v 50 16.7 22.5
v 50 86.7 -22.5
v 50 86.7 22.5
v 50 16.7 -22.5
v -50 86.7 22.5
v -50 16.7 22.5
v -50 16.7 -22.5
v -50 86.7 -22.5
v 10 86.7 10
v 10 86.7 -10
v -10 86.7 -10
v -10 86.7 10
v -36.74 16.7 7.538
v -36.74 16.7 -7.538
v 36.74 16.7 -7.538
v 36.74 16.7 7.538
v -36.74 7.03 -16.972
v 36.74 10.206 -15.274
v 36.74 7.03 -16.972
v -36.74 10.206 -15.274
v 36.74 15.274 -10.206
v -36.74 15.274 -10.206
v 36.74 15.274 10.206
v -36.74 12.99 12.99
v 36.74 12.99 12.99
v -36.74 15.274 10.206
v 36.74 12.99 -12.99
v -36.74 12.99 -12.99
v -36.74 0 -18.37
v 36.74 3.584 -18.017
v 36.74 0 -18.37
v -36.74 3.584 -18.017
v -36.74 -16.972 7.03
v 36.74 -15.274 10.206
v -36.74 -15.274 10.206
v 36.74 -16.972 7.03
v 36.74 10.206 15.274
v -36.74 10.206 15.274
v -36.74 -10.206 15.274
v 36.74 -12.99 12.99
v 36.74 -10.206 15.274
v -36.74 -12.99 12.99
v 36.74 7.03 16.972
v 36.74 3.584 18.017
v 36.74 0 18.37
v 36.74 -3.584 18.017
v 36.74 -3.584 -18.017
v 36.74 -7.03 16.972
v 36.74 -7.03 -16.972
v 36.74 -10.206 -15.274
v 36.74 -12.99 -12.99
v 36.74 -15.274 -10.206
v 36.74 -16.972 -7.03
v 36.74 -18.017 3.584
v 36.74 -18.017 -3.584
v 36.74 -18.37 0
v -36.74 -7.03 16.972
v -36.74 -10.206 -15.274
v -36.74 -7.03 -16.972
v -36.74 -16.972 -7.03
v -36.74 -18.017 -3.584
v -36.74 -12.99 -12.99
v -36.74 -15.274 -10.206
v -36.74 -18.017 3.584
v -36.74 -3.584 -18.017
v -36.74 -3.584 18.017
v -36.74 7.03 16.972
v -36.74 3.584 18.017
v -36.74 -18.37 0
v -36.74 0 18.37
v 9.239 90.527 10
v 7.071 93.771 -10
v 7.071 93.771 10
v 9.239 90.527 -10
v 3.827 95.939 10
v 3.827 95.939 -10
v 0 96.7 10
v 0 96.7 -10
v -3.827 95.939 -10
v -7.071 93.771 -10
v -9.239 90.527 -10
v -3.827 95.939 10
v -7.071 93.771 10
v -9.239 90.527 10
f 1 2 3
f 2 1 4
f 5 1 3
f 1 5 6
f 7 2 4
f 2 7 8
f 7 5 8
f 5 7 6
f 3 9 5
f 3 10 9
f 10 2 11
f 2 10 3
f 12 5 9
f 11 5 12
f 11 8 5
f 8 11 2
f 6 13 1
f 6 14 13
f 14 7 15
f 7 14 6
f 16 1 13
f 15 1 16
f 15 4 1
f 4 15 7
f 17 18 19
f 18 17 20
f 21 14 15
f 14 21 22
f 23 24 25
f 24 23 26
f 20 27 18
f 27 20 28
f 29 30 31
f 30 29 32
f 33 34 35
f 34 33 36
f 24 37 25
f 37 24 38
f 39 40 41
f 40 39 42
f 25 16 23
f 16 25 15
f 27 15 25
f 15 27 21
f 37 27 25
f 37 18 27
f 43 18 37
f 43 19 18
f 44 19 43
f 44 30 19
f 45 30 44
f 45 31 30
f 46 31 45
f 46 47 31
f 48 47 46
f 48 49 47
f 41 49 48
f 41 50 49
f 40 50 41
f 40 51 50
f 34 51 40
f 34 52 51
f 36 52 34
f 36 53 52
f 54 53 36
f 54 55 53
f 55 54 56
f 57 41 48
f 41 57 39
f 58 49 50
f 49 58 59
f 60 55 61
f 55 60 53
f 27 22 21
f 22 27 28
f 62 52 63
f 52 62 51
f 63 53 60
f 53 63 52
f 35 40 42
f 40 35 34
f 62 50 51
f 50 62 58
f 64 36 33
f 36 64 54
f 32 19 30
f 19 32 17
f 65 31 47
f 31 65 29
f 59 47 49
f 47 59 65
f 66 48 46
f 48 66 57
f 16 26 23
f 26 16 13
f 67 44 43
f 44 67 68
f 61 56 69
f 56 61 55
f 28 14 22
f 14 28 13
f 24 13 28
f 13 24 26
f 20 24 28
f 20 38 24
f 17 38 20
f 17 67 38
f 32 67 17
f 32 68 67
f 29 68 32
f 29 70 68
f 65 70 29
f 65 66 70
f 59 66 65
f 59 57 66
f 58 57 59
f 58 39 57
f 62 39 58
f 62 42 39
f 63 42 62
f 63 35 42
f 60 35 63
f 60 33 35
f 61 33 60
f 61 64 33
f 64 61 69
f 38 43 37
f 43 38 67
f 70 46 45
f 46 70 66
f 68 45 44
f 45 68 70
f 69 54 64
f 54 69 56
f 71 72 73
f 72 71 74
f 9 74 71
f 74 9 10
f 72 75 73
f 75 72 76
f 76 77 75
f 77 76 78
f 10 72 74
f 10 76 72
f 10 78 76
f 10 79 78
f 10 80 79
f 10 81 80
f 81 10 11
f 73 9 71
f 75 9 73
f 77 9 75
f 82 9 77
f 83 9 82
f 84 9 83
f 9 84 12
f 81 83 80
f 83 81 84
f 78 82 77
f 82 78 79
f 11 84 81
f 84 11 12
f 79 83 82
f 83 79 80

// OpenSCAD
// Auto-generated by scripts/author_from_manifest.py (Phase D.3).
// Source: data/phase_d_manifest.json (sku_intent='potter-vsr-flow-switch-6in').
// Do not hand-edit — regenerate from the manifest.
//
// @part potter_vsr_flow_switch_6in
// @kind device
// @category trim.flow.switch
// @display-name "Potter VSR Vane Flow Switch 6\""
// @mfg potter_electric_signal
// @mfg-pn VSR-6
// @listing UL FM
// @price-usd 155.00
// @install-minutes 18
// @crew journeyman
// @param size_in number default=6 label="Size" unit="in"
// @port pipe position=[0,0,0] direction=[-1,0,0] style=grooved size_in=6 role=run_a

size_in = 6.0;

function od_mm(nps) =
    nps ==   1  ? 33.4 :
    nps == 1.25 ? 42.2 :
    nps == 1.5  ? 48.3 :
    nps ==   2  ? 60.3 : 33.4;

od = od_mm(size_in);
box_w = 100;
box_h = 70;
box_d = 45;

union() {
    // Enclosure
    translate([0, box_h/2 + od/2, 0])
        cube([box_w, box_h, box_d], center = true);
    // Pipe saddle stub
    rotate([0, 90, 0])
        cylinder(h = od * 2.2, d = od * 1.1, center = true, $fn = 32);
    // Conduit nipple
    translate([0, box_h + od/2, 0])
        cylinder(h = 20, d = 20, center = true, $fn = 16);
}
